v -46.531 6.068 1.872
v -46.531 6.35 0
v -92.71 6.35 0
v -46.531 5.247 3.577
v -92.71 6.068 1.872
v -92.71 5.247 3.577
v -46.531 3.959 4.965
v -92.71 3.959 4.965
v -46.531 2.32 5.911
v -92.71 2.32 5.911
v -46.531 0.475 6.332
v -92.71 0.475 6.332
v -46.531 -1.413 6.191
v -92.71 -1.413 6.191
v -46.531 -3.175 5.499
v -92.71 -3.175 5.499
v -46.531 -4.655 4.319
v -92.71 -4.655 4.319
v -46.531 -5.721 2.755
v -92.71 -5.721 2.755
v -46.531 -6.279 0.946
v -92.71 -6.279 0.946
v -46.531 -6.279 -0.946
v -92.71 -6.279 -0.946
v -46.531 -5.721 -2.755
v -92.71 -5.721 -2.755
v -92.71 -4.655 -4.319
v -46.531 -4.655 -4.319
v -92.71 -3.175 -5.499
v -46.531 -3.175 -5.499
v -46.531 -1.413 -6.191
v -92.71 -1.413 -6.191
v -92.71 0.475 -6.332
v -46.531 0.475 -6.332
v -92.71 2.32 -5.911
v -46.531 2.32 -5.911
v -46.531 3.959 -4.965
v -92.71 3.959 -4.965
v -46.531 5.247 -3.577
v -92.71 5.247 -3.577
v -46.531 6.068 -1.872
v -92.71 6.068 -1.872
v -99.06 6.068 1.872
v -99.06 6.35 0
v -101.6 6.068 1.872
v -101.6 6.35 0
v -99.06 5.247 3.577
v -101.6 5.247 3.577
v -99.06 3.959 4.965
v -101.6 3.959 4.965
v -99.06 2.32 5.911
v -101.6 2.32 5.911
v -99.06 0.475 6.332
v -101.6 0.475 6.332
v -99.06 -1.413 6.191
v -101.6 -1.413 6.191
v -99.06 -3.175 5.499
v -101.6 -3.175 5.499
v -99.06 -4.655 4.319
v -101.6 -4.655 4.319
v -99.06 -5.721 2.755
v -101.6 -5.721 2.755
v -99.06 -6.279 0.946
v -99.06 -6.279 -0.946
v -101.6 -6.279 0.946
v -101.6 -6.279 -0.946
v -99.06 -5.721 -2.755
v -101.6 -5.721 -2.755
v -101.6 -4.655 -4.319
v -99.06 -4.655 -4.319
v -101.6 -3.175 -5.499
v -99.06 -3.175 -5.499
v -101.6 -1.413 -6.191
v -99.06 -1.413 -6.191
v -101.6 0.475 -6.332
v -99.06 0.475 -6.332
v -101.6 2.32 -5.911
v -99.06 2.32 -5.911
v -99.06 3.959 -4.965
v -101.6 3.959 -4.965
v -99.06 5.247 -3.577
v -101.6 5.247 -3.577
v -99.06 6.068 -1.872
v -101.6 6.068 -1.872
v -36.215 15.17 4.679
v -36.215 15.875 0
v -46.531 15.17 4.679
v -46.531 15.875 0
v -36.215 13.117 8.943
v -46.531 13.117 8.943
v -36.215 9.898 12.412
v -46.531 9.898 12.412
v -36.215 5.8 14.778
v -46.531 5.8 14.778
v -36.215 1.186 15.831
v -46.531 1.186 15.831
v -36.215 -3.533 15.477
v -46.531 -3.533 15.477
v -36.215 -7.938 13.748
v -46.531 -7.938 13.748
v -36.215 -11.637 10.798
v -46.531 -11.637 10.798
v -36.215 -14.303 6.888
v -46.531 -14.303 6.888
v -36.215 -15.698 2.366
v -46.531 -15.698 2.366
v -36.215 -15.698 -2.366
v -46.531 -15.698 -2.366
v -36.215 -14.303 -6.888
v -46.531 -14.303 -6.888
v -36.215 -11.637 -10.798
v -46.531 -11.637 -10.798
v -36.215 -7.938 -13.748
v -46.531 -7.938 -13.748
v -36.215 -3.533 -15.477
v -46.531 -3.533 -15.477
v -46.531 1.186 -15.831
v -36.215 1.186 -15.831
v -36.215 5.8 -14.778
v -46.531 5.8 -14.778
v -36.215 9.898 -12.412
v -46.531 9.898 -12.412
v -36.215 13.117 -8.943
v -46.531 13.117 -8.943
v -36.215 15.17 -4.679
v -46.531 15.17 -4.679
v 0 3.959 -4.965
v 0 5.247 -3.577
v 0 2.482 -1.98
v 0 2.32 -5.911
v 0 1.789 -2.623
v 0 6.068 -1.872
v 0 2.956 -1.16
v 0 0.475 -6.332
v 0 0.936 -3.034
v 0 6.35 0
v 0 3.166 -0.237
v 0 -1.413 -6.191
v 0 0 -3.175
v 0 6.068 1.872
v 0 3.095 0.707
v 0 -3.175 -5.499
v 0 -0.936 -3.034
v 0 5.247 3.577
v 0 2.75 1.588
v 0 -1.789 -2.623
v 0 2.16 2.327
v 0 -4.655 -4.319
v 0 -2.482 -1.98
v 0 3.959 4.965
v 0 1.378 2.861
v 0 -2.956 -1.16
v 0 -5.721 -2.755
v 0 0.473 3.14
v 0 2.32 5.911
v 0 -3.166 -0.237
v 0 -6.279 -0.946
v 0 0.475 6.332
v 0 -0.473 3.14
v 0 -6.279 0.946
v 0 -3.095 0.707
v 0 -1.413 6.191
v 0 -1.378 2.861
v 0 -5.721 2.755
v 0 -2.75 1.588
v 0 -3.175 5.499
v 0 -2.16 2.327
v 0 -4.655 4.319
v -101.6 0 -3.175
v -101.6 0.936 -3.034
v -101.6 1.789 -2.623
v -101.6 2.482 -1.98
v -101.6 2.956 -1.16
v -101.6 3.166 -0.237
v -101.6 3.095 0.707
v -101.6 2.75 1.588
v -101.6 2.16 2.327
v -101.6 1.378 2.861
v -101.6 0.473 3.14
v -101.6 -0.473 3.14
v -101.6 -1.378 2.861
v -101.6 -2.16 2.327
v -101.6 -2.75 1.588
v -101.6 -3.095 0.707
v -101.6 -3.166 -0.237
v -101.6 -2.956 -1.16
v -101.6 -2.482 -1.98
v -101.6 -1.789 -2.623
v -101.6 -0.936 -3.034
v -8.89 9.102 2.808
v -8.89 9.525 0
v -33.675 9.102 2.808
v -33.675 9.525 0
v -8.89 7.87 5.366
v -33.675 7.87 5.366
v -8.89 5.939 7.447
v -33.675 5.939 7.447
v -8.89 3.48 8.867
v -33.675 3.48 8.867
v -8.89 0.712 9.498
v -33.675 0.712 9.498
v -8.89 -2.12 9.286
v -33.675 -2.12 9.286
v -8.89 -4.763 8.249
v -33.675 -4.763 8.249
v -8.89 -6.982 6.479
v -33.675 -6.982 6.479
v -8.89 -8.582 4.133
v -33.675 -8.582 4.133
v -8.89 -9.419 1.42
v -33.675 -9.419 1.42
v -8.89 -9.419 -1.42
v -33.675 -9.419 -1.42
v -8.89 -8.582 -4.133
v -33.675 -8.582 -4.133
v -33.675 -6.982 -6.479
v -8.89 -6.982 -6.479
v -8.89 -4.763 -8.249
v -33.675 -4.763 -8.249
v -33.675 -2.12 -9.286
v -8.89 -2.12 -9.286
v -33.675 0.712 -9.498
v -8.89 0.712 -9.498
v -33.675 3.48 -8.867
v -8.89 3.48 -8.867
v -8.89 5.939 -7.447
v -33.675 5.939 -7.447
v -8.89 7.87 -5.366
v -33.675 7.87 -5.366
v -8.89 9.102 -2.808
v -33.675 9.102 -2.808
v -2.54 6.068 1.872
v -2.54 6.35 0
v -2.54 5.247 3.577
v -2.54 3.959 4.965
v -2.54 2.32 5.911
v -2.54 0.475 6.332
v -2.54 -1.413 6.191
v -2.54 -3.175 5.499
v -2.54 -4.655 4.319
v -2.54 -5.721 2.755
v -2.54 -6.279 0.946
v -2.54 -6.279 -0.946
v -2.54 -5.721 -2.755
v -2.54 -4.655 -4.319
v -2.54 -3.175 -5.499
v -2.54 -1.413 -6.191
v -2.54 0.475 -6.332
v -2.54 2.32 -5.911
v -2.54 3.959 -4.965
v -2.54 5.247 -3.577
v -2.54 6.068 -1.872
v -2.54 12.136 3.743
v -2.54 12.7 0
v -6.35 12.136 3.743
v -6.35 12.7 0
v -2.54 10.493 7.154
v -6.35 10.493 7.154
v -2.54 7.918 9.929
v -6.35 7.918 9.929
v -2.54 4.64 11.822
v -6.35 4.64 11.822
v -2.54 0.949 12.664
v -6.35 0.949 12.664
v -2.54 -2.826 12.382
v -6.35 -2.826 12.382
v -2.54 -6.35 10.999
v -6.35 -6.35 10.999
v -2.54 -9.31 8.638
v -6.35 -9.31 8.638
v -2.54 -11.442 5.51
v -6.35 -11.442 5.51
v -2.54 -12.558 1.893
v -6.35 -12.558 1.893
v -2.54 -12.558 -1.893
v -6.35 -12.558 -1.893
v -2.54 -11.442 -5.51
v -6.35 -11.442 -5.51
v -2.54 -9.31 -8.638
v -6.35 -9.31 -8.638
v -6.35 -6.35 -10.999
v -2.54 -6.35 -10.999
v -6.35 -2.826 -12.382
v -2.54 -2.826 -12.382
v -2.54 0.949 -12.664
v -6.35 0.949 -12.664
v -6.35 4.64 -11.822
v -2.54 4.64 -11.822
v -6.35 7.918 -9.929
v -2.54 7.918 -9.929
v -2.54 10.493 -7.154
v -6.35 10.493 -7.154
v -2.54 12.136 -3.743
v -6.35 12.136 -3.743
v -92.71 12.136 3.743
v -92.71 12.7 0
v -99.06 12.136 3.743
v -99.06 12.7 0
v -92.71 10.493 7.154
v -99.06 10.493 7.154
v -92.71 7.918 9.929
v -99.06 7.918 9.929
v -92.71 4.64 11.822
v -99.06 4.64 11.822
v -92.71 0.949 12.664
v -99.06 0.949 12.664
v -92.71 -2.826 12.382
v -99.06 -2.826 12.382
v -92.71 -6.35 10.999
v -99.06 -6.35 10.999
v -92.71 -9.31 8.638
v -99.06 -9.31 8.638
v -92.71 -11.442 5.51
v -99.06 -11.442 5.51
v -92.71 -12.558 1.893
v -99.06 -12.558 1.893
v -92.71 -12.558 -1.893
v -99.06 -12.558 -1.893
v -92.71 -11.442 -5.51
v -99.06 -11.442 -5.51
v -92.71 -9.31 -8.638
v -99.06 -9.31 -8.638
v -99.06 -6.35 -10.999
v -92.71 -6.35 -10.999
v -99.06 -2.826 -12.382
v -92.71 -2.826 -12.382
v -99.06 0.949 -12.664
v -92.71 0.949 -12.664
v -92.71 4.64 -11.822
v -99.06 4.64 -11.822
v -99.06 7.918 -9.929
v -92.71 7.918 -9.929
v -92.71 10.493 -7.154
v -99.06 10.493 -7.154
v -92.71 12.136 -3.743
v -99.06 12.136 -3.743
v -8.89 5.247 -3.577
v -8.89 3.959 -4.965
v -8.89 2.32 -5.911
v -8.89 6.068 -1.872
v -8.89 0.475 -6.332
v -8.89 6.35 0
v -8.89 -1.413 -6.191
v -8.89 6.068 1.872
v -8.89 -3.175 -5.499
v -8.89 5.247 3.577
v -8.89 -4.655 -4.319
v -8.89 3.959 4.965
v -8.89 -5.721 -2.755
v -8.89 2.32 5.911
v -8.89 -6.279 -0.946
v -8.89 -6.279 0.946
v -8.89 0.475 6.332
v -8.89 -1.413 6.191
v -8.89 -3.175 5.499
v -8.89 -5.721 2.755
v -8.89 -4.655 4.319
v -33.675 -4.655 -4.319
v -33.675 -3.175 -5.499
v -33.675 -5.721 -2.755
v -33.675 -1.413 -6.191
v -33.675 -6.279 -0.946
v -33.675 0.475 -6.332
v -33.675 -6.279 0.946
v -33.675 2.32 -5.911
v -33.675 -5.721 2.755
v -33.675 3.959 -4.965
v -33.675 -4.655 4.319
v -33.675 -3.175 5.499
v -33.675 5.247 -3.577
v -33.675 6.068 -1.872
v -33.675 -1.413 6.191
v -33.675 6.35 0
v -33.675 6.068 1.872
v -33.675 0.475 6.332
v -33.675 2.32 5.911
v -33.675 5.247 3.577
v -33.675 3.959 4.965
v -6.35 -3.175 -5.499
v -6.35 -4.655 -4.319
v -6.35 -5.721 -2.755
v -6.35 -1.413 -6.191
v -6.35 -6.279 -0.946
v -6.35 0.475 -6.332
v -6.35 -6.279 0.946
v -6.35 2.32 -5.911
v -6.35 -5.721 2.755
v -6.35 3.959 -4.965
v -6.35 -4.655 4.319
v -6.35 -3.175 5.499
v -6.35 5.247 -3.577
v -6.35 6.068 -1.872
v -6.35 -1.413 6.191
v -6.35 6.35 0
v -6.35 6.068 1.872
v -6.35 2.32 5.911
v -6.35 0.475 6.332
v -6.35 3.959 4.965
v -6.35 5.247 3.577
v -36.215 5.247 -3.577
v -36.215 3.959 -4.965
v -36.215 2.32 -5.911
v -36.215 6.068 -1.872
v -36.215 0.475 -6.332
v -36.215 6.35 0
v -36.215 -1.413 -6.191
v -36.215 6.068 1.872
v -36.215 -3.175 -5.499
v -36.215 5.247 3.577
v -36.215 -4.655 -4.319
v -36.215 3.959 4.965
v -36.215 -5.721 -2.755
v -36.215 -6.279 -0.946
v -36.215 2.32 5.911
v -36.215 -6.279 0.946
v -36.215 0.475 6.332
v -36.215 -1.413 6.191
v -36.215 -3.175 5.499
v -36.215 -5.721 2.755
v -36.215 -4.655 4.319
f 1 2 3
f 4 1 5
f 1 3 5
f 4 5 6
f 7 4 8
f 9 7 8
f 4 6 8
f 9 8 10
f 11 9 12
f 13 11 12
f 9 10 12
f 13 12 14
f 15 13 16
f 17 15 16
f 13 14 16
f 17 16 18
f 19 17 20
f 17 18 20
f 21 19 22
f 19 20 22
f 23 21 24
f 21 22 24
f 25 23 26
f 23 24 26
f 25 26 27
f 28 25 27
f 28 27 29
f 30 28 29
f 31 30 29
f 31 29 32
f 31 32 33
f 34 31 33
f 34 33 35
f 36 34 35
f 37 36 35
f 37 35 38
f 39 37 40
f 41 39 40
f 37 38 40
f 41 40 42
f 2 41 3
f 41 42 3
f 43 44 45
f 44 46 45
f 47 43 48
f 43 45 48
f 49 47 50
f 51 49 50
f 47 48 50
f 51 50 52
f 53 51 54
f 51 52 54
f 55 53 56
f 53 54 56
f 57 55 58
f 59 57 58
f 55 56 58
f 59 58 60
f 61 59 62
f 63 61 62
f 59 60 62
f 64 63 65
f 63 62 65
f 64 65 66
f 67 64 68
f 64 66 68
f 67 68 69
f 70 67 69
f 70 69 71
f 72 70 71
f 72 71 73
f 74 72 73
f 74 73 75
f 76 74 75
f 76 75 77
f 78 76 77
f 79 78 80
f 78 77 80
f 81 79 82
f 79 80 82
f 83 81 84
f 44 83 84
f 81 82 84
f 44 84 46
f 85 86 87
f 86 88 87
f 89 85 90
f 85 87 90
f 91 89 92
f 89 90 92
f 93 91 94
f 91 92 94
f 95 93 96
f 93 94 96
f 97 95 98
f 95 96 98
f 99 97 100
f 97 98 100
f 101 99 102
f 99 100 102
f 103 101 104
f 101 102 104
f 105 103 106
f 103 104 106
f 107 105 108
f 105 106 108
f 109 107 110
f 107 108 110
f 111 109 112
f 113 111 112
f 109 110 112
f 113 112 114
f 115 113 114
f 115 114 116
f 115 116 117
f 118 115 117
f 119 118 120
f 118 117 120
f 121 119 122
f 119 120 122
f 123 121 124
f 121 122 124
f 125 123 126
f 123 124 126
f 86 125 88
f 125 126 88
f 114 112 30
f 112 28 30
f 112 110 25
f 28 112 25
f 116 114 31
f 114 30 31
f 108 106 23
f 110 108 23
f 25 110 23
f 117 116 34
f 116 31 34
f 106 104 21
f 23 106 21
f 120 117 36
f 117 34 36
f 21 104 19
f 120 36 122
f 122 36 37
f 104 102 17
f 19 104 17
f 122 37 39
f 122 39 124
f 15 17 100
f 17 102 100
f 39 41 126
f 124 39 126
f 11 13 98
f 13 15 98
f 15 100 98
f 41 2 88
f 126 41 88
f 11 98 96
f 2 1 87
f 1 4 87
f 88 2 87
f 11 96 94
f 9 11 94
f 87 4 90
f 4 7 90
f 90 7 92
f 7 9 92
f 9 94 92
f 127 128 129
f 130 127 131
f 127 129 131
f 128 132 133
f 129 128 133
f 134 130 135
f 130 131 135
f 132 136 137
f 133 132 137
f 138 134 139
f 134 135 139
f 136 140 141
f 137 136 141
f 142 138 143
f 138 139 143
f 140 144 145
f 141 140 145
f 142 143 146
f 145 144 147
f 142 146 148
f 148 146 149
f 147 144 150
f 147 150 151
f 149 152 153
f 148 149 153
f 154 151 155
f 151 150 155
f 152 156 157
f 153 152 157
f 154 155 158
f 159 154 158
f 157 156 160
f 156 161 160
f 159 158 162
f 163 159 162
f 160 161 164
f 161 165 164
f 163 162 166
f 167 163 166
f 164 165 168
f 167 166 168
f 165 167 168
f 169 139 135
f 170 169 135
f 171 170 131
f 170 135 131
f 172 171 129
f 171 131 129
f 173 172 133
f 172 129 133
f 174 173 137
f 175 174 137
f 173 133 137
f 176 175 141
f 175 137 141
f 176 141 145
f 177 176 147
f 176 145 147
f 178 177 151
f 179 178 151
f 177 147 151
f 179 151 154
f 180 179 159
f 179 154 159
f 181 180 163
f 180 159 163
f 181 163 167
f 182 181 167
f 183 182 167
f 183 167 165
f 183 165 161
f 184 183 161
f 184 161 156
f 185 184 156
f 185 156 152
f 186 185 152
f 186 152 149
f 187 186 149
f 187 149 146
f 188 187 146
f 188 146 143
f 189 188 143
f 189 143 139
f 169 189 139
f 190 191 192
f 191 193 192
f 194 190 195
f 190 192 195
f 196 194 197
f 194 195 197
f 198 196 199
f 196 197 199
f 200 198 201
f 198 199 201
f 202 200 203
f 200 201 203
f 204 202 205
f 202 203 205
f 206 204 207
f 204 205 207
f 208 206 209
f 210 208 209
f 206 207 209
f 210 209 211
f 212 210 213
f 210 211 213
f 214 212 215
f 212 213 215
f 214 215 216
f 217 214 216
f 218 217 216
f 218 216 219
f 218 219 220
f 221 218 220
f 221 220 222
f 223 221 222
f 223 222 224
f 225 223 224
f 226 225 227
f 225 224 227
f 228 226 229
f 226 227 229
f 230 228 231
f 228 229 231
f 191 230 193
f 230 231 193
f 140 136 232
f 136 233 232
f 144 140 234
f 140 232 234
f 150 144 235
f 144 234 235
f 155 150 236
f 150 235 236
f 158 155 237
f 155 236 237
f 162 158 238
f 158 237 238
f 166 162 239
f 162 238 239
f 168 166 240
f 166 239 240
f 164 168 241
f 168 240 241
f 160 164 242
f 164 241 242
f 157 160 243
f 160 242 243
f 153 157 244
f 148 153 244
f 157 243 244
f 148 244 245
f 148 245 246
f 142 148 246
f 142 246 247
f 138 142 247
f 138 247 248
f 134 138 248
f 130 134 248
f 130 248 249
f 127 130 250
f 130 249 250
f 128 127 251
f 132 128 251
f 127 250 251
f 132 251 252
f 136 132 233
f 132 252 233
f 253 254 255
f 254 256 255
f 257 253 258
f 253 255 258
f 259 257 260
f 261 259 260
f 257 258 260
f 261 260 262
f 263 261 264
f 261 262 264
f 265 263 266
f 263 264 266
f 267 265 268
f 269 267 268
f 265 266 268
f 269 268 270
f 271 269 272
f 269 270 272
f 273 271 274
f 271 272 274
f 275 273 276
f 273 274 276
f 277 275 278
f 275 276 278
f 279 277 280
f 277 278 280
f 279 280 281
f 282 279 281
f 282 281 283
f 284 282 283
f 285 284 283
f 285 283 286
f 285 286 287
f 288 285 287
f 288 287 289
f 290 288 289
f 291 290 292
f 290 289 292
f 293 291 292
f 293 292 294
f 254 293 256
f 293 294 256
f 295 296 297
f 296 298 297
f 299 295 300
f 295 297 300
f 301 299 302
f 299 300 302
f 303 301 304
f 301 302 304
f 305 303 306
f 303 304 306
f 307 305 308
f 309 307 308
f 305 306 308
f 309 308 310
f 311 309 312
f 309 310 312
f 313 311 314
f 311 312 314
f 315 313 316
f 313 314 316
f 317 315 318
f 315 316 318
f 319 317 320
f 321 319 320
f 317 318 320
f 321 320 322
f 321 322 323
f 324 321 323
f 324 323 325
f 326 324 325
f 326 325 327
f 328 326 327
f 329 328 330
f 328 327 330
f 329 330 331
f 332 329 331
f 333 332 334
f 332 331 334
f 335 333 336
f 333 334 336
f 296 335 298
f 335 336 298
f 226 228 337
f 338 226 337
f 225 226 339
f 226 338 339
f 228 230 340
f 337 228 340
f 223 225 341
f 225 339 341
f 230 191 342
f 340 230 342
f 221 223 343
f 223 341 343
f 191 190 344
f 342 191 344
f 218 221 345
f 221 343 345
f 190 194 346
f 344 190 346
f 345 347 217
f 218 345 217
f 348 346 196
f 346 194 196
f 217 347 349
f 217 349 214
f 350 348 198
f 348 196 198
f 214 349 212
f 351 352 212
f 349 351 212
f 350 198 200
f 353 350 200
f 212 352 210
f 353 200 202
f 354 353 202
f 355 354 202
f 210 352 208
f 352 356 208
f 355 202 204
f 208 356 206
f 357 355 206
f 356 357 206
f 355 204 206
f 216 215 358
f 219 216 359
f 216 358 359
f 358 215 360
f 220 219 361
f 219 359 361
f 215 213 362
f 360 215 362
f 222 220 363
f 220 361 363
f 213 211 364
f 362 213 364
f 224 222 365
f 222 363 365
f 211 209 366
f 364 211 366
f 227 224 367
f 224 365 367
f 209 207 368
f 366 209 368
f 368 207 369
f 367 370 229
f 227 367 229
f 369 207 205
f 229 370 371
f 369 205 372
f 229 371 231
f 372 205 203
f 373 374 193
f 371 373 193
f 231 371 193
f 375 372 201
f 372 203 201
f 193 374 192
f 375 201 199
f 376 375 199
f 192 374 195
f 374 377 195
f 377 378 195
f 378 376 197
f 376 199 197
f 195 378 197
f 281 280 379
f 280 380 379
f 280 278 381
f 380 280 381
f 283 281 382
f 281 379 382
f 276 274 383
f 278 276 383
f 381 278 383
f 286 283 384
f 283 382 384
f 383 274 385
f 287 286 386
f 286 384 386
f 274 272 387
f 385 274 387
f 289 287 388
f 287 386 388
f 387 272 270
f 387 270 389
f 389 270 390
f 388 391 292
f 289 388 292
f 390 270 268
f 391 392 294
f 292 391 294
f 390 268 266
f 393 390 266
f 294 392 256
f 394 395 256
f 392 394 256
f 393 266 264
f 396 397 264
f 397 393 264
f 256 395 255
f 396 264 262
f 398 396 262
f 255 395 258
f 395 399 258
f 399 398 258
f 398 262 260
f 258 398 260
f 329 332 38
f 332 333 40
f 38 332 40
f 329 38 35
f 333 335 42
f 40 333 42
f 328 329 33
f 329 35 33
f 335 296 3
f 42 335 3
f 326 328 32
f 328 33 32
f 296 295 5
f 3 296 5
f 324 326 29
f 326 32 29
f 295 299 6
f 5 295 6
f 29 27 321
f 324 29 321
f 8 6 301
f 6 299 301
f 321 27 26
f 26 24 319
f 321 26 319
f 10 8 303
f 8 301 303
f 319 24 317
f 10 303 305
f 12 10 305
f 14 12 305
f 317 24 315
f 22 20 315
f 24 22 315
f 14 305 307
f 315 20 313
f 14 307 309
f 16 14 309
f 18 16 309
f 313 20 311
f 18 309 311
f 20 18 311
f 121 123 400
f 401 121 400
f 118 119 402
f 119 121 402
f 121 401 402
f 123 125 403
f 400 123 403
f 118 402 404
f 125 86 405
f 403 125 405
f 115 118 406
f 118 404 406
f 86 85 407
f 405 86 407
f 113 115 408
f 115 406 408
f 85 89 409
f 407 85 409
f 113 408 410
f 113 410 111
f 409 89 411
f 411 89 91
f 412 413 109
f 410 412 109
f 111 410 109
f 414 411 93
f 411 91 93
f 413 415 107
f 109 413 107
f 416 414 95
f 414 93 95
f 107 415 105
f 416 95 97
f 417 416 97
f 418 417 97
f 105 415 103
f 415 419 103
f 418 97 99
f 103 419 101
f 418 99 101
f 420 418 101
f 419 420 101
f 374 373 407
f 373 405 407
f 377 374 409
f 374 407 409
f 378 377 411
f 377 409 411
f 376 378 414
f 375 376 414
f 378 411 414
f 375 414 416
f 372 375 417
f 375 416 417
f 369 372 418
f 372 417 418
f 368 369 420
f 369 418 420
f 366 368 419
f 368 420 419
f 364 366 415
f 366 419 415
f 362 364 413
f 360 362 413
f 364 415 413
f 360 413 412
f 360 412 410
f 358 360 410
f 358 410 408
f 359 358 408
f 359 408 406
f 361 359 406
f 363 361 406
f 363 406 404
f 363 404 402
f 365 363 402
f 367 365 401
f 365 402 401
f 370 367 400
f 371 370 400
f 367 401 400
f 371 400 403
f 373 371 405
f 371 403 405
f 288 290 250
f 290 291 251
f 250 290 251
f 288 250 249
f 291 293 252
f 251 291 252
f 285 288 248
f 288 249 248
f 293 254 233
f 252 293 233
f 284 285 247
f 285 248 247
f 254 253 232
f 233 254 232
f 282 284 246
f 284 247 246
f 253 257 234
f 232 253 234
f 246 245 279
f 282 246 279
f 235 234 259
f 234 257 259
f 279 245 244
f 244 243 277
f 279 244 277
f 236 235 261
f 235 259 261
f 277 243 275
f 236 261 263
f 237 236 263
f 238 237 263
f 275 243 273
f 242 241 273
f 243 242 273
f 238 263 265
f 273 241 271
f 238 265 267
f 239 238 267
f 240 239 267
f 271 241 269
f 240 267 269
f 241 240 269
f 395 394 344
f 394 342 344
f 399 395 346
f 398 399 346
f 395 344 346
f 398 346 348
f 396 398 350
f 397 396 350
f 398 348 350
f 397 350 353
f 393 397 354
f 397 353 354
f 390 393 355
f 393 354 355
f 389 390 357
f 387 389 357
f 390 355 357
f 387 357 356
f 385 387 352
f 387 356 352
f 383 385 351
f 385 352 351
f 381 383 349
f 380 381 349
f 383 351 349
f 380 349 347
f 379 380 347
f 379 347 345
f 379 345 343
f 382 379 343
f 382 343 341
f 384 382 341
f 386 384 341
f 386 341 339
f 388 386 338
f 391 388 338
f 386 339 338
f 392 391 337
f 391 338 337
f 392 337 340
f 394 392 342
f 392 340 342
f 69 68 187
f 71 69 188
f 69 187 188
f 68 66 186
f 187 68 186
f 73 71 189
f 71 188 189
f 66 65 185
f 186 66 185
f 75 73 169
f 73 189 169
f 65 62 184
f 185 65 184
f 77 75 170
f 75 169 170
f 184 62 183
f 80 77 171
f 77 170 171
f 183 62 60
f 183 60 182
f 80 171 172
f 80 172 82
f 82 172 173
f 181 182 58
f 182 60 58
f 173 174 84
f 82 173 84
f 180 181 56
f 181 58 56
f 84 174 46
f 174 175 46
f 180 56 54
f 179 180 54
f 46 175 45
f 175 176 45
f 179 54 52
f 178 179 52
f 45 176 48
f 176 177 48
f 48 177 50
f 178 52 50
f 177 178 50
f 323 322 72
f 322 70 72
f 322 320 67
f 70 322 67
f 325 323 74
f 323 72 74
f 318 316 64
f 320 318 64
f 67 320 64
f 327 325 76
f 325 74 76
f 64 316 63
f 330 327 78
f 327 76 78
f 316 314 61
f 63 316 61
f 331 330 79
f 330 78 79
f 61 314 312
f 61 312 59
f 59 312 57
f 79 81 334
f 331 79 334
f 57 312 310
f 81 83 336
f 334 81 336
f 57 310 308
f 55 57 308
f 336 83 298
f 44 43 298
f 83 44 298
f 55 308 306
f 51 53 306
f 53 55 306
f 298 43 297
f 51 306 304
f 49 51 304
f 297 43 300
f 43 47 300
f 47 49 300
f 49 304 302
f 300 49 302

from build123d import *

# Parameters (mm, degrees)
SKETCH2_R               = 3.175
CUT_EXTRUDE1_DEPTH      = 1
CUT_EXTRUDE1_DEPTH_BACK = 102.6


with BuildPart() as part:
    # Sketch1 → Revolve1 (revolve)
    with BuildSketch(Plane.XY):
        Polygon((0, 0), (0, 6.35), (-2.54, 6.35), (-2.54, 12.7), (-6.35, 12.7), (-6.35, 6.35), (-8.89, 6.35), (-8.89, 9.525), (-33.67488639, 9.525), (-33.67488639, 6.35), (-36.21488639, 6.35), (-36.21488639, 15.875), (-46.531378447, 15.875), (-46.531378447, 6.35), (-92.71, 6.35), (-92.71, 12.7), (-99.06, 12.7), (-99.06, 6.35), (-101.6, 6.35), (-101.6, 0), align=None)
    revolve(axis=Axis((0, 0, 0), (1, 0, 0)))

    # Sketch2 → Cut-Extrude1 (cut, two sides)
    with BuildSketch(Plane(origin=(0, 0, 0), x_dir=(0, 0, -1), z_dir=(1, 0, 0))) as cut_extrude1_sk:
        Circle(SKETCH2_R)
    extrude(amount=CUT_EXTRUDE1_DEPTH, mode=Mode.SUBTRACT)
    extrude(cut_extrude1_sk.sketch, amount=-CUT_EXTRUDE1_DEPTH_BACK, mode=Mode.SUBTRACT)


solid = part.part
